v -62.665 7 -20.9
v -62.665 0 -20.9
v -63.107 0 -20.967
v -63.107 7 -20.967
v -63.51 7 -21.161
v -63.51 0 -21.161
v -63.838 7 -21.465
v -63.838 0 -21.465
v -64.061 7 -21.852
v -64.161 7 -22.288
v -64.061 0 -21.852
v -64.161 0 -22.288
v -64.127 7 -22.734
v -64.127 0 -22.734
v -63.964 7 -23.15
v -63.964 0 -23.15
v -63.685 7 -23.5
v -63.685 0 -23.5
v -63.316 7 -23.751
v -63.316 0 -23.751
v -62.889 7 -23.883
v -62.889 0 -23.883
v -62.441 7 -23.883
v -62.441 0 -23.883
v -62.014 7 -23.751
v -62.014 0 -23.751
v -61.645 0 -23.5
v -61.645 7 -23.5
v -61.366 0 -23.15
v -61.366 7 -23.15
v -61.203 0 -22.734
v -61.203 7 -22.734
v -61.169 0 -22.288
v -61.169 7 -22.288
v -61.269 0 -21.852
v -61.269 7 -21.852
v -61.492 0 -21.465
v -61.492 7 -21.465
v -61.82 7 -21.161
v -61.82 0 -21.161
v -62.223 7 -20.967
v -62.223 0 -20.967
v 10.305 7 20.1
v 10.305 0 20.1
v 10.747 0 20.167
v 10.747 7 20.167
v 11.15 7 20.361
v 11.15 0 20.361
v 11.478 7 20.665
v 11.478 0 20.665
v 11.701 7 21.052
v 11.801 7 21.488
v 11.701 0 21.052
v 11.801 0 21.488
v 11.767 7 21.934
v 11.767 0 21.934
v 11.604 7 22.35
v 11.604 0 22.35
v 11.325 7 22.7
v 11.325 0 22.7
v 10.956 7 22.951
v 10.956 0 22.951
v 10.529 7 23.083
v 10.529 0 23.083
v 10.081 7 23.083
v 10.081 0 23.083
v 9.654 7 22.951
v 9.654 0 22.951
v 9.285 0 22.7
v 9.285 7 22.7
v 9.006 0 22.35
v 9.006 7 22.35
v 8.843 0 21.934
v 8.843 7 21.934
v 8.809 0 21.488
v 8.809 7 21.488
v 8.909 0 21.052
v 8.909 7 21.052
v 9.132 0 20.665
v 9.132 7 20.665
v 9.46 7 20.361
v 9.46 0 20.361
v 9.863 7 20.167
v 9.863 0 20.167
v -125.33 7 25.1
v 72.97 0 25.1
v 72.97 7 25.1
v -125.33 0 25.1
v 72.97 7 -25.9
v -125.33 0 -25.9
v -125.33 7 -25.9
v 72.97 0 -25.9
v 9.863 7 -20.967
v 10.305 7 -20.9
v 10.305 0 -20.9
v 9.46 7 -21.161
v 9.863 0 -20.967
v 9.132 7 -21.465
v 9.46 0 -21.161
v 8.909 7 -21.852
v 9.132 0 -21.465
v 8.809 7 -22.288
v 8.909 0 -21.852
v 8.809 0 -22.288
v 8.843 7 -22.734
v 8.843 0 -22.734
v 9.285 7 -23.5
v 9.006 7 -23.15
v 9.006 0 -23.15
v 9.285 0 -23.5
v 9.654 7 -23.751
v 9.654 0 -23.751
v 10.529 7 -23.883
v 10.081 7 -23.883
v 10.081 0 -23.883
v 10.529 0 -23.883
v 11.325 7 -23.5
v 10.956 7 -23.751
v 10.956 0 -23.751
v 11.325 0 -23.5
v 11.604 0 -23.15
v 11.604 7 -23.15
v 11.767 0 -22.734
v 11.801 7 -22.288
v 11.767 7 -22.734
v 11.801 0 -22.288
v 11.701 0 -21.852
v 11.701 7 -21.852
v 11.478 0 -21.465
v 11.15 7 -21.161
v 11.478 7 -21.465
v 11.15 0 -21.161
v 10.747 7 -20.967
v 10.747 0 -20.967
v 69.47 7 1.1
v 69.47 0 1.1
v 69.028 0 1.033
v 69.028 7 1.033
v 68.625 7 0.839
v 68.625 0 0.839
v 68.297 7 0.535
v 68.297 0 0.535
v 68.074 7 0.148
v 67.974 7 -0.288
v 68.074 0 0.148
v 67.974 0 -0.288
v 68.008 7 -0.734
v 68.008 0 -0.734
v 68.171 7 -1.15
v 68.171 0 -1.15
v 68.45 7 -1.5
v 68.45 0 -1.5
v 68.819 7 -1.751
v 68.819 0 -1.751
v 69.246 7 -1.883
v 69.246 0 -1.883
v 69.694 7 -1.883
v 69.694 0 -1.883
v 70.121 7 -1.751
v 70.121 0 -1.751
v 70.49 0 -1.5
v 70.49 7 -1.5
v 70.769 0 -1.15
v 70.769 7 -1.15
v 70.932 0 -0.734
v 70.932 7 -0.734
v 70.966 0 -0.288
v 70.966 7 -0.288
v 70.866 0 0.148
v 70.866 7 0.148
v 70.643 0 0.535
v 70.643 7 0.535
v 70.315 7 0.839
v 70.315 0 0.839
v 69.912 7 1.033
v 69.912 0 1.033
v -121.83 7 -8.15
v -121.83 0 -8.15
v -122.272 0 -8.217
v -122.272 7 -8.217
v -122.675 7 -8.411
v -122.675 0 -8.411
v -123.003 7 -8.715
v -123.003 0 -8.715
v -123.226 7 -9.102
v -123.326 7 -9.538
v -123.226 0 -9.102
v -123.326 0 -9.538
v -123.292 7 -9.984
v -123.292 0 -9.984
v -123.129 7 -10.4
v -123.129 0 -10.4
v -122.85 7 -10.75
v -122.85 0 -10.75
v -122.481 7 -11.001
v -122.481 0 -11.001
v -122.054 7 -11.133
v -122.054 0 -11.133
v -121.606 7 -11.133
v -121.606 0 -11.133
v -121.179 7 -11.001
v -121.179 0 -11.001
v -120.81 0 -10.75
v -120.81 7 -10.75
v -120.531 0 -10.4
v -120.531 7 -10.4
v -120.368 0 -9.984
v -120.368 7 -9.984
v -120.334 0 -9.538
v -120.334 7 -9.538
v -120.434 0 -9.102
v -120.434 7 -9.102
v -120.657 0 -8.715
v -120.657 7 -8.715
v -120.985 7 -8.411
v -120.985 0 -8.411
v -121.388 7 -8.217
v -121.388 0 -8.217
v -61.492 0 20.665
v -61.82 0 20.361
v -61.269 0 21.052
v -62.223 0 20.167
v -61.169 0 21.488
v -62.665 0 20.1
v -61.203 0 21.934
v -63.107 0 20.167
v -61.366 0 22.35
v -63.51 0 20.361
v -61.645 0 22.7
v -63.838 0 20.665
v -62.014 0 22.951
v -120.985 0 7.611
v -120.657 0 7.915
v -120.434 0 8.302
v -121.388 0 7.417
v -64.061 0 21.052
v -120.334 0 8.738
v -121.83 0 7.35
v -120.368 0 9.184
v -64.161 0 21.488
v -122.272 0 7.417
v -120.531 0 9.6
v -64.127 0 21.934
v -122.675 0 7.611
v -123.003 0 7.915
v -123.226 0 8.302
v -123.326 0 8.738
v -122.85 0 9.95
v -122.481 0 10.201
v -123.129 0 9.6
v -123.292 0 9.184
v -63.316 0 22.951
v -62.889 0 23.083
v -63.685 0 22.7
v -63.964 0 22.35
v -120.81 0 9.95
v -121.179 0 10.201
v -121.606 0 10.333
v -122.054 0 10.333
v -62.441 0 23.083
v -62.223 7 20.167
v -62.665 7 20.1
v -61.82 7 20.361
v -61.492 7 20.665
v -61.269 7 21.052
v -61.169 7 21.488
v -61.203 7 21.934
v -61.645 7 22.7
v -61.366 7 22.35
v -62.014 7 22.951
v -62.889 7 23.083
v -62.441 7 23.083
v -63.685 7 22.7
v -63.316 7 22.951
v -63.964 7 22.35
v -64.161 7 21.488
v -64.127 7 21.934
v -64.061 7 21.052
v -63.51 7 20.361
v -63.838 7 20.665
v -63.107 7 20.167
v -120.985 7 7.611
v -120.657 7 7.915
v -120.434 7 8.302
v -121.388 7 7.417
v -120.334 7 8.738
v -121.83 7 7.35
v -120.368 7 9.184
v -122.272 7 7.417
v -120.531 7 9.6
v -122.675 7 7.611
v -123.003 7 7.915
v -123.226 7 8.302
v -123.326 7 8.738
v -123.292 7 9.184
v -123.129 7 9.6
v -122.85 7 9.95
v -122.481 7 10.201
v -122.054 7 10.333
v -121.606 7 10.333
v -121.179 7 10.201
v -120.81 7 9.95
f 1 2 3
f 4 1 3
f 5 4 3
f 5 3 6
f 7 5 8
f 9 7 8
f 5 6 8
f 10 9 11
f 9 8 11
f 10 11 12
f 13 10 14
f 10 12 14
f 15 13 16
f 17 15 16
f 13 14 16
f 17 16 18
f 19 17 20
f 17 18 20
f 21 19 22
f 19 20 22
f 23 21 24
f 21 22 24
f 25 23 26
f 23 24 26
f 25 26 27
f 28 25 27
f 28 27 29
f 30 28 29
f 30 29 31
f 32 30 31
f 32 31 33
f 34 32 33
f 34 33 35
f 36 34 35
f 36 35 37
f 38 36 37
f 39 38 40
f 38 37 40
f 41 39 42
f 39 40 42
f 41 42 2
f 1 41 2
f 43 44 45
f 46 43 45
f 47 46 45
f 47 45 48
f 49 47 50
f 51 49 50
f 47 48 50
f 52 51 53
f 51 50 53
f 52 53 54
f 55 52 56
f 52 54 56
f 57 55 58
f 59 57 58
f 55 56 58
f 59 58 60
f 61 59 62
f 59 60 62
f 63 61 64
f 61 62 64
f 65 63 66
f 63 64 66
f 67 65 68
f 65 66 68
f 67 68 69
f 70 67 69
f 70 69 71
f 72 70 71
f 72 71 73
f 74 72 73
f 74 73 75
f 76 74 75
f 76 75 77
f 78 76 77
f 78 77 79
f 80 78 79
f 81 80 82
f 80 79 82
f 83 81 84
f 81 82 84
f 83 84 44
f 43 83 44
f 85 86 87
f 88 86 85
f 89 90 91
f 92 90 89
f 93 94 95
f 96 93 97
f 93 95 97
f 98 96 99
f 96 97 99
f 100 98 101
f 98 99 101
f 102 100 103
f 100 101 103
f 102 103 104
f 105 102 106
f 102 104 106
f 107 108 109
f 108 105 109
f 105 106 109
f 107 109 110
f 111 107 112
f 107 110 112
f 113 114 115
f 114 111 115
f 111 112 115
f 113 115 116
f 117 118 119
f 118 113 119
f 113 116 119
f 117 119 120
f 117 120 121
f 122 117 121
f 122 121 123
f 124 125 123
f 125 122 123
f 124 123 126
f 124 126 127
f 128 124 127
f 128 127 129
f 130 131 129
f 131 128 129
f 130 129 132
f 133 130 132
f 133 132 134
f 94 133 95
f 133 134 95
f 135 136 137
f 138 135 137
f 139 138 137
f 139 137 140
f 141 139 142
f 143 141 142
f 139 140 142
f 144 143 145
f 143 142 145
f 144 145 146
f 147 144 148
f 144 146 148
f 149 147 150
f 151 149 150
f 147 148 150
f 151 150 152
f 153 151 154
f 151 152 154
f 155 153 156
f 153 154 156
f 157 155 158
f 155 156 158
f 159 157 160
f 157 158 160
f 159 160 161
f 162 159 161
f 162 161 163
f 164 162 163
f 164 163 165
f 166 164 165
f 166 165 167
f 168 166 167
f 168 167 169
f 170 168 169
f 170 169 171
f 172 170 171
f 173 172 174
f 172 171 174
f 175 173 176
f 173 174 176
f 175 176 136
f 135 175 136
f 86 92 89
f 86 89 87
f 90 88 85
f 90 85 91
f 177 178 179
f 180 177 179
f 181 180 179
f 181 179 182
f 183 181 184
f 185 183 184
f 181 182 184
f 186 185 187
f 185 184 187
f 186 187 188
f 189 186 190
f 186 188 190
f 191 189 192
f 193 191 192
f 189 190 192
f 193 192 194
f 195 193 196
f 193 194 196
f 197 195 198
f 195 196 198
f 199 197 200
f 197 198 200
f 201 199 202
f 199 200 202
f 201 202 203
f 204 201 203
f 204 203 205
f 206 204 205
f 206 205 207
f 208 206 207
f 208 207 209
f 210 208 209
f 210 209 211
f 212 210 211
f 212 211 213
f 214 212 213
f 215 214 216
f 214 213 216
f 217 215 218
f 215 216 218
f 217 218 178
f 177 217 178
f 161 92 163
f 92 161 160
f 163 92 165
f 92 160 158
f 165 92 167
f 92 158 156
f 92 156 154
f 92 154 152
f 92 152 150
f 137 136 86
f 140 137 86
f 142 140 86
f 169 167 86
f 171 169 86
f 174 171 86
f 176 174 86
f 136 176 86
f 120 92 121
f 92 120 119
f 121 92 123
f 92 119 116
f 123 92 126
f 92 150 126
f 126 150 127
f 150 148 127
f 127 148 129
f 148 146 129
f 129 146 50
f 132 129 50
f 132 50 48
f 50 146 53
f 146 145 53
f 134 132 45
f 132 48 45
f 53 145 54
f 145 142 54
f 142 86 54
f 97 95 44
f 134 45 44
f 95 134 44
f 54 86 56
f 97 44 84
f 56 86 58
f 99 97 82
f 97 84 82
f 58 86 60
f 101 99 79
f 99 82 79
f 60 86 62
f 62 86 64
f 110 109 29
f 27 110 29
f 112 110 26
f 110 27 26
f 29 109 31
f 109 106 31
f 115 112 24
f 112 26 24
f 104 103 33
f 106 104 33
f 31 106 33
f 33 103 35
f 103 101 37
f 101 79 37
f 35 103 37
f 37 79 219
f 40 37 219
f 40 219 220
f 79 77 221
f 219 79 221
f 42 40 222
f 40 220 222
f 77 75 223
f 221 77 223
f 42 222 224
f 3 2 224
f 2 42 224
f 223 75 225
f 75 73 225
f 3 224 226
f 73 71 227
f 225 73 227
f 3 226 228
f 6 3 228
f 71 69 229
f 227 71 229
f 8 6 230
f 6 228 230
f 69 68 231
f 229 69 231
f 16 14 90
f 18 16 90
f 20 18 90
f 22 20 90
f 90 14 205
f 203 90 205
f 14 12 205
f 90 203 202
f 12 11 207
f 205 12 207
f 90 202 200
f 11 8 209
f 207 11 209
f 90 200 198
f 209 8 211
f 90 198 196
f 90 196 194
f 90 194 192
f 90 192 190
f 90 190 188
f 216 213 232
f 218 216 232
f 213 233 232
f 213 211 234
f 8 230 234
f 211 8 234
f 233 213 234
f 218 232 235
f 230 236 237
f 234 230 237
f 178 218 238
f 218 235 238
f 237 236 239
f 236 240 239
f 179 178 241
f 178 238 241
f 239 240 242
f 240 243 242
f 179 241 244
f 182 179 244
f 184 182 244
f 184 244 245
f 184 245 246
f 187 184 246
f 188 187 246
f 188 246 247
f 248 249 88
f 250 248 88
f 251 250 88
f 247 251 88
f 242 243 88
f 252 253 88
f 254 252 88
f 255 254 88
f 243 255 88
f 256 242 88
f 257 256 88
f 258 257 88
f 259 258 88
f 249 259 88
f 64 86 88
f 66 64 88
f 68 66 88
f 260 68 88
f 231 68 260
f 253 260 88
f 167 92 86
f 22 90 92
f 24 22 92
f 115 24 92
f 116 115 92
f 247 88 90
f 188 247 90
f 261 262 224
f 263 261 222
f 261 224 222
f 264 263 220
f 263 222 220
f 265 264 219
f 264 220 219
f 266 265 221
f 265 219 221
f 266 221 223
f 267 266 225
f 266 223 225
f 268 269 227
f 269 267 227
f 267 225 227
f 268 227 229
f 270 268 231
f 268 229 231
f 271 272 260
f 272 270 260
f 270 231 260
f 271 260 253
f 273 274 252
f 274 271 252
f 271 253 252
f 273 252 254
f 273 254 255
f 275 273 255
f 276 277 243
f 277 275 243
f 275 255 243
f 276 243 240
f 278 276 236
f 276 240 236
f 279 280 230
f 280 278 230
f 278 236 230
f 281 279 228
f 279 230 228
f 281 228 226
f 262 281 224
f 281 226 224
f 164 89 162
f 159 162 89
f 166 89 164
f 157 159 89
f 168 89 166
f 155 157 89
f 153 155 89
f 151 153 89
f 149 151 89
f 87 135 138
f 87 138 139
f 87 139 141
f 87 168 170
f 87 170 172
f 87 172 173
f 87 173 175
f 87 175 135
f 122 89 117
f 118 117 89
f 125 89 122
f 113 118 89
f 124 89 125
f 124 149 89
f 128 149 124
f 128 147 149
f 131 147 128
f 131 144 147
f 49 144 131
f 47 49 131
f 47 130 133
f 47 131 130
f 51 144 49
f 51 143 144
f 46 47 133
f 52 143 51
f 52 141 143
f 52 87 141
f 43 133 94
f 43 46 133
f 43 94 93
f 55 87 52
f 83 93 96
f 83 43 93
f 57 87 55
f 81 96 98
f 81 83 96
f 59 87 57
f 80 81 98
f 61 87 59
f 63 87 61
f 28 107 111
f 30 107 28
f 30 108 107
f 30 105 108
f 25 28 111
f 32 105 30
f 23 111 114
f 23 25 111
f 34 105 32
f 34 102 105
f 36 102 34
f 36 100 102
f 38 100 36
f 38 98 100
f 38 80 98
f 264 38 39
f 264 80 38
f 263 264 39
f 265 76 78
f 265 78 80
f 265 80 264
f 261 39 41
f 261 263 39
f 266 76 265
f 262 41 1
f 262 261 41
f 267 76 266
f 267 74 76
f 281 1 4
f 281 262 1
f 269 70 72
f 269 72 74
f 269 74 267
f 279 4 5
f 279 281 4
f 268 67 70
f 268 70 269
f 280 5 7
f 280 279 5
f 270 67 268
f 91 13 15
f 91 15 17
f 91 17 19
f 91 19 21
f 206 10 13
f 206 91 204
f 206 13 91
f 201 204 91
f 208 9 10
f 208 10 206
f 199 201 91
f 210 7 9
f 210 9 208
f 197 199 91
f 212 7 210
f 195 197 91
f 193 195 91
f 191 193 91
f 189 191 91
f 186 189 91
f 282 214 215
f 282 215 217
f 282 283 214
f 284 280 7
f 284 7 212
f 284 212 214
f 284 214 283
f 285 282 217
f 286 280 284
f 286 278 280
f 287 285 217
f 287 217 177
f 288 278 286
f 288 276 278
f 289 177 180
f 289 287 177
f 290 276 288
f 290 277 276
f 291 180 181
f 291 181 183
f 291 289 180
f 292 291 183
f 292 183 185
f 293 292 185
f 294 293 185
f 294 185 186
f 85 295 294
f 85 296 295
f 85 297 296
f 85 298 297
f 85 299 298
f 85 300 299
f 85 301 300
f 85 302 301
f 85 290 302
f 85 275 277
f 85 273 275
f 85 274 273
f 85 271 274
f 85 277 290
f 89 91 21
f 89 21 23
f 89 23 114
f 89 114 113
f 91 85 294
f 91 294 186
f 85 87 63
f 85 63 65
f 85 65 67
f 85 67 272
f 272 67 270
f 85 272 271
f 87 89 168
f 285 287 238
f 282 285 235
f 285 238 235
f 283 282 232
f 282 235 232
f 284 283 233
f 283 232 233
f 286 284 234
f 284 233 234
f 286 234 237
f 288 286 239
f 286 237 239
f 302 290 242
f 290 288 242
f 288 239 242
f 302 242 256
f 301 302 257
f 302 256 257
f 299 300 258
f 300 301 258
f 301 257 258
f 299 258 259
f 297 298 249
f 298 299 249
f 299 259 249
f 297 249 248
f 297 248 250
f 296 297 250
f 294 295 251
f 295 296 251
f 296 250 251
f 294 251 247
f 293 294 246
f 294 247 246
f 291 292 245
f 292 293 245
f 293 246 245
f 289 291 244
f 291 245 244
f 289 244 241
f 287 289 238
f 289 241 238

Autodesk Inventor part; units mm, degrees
ref_plane "YZ Plane" through (0, 0, 0) normal (1, 0, 0) x (0, 1, 0)
ref_plane "XZ Plane" through (0, 0, 0) normal (0, 1, 0) x (-1, 0, 0)
sketch "Sketch1" plane through (0, 0, 0) normal (0, 1, 0) x (-1, 0, 0)
  line L0 (-72.97, 25.1) -> (125.33, 25.1)
  line L1 (125.33, 25.1) -> (125.33, -25.9)
  line L2 (125.33, -25.9) -> (-72.97, -25.9)
  line L3 (-72.97, -25.9) -> (-72.97, 25.1)
  line L4 (-72.97, 25.1) -> (125.33, -25.9) construction
  line L5 (125.33, 25.1) -> (-72.97, -25.9) construction
  point P0 (26.18, -0.4)
  dimension "d1" = 51
  dimension "d31" = 198.3
extrude "Extrusion1" add sketch "Sketch1" along normal blind 7
sketch "Sketch2" plane through (0, 7, 0) normal (0, 1, 0) x (1, 0, 0)
  circle A0 centre (-121.83, 9.65) radius 1.5
  circle A1 centre (-62.665, 22.4) radius 1.5
  line L0 (72.97, 25.9) -> (-125.33, 25.9) projected
  line L1 (-125.33, 25.9) -> (-125.33, -25.1) projected
  circle A2 centre (69.47, 0.4) radius 1.5
  line L2 (72.97, -25.1) -> (72.97, 25.9) projected
  point P0 (0, 0)
  dimension "d5" = 3
  dimension "d21" = 3
  dimension "d22" = 3.5
  dimension "d23" = 62.665
  dimension "d32" = 3.5
  dimension "d33" = 16.25
  dimension "d34" = 3
  dimension "d35" = 3.5
  dimension "d36" = 25.5
hole "Hole1" at (-121.83, 7, -9.65) direction (0, -1, 0) diameter 3 end through all
hole "Hole3" at (-62.665, 7, -22.4) direction (0, -1, 0) diameter 3 end through all
ref_plane "Work Plane1" through (-26.18, 0, 25.1) normal (1, 0, 0) x (0, 0, -1)
mirror "Mirror7" about plane through (-26.18, 0, 25.1) normal (1, 0, 0) of "Hole3"
hole "Hole4" at (69.47, 7, -0.4) direction (0, -1, 0) diameter 3 end through all
ref_plane "Work Plane2" through (72.97, 0, -0.4) normal (0, 0, -1) x (-1, 0, 0)
mirror "Mirror8" about plane through (72.97, 0, -0.4) normal (0, 0, -1) of "Hole3", "Mirror7", "Hole1"
properties part number "Mold_BottomWall"
